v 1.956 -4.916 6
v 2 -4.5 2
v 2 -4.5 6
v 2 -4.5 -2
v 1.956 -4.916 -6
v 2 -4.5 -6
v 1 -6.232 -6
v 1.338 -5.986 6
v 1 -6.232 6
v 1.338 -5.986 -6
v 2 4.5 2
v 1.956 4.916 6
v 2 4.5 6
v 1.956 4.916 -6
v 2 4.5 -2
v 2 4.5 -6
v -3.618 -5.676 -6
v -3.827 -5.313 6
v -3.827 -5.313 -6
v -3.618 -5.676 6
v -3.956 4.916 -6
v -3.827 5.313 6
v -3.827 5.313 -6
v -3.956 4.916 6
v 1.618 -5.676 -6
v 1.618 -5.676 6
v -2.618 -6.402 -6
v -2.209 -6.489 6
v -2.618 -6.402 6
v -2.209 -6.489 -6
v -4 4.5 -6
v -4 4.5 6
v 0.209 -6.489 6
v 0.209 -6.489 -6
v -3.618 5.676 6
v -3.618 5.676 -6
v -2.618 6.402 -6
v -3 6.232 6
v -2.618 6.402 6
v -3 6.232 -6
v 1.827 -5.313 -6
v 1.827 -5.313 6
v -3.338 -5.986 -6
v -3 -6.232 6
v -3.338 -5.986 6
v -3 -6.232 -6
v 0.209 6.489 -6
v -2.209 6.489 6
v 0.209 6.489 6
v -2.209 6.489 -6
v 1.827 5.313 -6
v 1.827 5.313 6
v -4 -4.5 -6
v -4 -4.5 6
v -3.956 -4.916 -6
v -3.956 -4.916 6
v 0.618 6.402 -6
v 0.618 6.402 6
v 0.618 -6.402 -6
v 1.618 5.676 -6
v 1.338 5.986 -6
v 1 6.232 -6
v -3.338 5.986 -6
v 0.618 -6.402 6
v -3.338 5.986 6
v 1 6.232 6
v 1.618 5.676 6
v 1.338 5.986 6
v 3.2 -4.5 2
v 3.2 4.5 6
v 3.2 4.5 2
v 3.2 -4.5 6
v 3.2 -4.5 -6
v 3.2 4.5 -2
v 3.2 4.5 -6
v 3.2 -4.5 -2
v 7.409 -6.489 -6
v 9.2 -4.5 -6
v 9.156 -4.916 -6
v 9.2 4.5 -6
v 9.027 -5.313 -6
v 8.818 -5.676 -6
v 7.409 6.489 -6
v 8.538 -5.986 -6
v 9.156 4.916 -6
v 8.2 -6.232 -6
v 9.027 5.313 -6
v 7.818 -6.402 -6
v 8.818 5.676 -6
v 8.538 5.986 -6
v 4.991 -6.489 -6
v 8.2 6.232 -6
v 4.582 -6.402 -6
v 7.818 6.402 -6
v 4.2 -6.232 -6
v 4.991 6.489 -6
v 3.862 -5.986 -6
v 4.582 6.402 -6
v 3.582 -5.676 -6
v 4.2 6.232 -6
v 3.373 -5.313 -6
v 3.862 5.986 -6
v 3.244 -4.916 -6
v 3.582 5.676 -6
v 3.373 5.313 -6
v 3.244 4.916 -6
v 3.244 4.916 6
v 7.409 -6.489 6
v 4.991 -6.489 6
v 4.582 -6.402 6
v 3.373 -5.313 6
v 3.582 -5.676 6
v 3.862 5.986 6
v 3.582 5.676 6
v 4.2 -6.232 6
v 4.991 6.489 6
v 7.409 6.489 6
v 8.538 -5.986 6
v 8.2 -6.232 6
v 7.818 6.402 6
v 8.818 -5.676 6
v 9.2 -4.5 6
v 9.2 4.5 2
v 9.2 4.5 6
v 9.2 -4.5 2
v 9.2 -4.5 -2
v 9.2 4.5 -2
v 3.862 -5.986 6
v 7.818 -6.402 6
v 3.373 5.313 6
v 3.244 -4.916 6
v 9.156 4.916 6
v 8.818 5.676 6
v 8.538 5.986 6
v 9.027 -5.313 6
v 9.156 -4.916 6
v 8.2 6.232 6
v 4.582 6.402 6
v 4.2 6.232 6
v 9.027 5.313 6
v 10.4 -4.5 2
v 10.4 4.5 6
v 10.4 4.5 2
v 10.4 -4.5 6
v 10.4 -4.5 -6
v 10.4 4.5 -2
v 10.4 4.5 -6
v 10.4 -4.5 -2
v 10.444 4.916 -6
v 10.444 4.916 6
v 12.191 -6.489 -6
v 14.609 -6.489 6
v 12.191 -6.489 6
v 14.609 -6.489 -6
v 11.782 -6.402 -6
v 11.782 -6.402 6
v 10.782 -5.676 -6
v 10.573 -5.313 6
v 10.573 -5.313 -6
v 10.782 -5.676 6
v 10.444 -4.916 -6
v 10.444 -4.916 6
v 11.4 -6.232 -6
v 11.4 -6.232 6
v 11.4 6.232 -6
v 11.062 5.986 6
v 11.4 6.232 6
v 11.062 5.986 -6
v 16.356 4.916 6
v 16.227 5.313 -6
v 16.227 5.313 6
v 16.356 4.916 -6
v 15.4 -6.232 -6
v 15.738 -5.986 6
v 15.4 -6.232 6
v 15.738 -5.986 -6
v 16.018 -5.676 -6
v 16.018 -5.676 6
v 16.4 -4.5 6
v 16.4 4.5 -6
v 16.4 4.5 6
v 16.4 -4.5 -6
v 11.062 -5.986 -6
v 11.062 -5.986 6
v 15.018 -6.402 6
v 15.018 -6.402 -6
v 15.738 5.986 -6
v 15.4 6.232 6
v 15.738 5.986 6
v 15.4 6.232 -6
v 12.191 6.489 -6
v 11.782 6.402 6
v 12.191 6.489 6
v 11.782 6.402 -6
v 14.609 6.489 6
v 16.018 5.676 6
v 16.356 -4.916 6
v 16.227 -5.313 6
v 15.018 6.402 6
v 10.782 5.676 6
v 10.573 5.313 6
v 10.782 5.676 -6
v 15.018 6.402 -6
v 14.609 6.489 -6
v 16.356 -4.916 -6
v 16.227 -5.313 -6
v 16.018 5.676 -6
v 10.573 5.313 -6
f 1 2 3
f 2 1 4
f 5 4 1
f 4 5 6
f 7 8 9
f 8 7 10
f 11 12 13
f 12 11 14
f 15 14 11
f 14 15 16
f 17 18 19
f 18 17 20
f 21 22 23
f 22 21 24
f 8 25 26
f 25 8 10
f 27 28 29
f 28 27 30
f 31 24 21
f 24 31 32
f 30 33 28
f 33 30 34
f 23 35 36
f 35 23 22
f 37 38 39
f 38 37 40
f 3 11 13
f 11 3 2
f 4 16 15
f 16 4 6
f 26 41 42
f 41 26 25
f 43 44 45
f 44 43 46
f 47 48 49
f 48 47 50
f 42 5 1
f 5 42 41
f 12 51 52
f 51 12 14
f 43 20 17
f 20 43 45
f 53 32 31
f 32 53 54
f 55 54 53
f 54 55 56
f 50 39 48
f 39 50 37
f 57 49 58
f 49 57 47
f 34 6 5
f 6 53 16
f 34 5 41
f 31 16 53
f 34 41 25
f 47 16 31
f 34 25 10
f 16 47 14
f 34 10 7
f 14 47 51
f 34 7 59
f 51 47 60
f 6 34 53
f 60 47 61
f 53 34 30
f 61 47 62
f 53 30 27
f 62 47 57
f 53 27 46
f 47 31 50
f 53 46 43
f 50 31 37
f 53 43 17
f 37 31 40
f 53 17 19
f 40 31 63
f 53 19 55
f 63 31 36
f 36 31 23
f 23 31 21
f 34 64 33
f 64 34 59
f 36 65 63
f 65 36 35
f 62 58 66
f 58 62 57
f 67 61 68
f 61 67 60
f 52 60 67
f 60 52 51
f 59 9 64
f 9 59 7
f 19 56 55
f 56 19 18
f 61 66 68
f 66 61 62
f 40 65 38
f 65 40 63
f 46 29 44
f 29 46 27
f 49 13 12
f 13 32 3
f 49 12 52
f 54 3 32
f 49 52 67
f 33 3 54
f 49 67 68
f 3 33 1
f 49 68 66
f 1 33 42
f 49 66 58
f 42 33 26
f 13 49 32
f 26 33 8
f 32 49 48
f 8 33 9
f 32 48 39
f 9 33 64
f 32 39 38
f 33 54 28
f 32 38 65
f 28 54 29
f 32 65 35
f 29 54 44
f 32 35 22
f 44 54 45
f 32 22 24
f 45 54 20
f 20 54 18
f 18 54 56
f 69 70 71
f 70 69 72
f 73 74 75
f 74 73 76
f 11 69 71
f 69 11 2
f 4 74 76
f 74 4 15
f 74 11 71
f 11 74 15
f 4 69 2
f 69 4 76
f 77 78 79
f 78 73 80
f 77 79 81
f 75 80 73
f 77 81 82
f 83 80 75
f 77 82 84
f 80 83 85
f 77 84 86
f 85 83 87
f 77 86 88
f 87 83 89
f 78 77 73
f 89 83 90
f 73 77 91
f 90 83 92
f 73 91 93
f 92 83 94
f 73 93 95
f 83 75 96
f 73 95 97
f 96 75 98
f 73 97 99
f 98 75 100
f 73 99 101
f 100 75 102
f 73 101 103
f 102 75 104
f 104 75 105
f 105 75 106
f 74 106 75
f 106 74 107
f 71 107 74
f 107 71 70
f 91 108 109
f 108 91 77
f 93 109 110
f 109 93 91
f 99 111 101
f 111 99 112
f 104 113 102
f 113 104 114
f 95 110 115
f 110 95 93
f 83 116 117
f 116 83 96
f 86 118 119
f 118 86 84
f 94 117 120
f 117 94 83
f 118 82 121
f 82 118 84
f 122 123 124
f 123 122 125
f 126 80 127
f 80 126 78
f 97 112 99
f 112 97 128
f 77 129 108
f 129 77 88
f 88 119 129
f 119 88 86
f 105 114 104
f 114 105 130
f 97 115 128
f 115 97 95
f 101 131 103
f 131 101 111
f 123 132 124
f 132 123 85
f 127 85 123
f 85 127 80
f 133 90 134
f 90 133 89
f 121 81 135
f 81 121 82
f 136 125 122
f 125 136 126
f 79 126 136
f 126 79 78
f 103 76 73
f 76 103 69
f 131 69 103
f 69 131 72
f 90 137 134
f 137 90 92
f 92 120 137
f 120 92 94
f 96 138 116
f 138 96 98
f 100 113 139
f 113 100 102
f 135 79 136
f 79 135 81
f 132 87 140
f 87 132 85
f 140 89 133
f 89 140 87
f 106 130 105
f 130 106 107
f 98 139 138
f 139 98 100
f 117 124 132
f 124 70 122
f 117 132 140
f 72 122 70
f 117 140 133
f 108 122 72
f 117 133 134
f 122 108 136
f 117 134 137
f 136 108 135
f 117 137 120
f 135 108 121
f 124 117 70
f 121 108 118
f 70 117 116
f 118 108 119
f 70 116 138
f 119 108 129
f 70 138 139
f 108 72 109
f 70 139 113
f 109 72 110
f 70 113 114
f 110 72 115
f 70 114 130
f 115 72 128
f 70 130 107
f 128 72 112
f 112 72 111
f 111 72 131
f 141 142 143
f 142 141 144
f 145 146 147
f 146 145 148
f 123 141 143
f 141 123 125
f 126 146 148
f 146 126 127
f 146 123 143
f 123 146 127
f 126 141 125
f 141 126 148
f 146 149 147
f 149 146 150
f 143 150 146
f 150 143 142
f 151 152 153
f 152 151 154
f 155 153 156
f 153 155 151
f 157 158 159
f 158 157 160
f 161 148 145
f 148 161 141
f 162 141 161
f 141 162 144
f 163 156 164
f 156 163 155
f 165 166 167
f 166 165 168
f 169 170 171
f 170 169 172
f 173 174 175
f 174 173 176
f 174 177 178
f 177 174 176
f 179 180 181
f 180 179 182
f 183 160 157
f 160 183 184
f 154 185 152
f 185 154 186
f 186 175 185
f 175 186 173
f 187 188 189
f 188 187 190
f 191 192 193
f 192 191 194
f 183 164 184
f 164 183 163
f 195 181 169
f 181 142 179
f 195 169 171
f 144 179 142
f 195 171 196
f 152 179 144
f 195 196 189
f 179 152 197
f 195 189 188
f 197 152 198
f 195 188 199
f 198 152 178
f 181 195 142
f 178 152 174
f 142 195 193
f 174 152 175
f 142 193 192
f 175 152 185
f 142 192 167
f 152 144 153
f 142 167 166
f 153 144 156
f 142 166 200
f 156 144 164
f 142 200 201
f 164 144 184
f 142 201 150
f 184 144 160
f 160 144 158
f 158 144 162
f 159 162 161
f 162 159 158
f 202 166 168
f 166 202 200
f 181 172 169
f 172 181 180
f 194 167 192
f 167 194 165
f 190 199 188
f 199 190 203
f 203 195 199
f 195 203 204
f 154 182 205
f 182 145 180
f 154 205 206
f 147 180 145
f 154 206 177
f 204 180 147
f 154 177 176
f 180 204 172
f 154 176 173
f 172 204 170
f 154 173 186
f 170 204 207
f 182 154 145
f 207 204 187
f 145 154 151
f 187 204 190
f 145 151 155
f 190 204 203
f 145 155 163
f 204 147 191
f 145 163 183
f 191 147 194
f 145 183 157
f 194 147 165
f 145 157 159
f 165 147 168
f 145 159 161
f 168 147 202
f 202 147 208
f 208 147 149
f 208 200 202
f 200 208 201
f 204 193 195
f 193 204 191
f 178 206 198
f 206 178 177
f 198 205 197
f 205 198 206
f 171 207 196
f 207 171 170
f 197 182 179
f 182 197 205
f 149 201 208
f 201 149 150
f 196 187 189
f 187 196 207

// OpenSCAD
$fn=30;
height=12;
radius=2;
union(){
    hull(){
        translate([0,-4.5,0])cylinder(r=radius,h=height, center=true);
        translate([-2,4.5,0])cylinder(r=radius,h=height, center=true);
        translate([0,4.5,0])cylinder(r=radius,h=height, center=true);
        translate([-2,-4.5,0])cylinder(r=radius,h=height, center=true);
  }
  translate([2.6,0,0])cube([radius/1.666666667,radius+7,radius+2],center=true);
   translate([7.2,0,0]) hull(){
        translate([0,-4.5,0])cylinder(r=radius,h=height, center=true);
        translate([-2,4.5,0])cylinder(r=radius,h=height, center=true);
        translate([0,4.5,0])cylinder(r=radius,h=height, center=true);
        translate([-2,-4.5,0])cylinder(r=radius,h=height, center=true);
  }
  translate([9.8,0,0])cube([radius/1.666666667,radius+7,radius+2],center=true);
   translate([14.4,0,0]) hull(){
        translate([0,-4.5,0])cylinder(r=radius,h=height, center=true);
        translate([-2,4.5,0])cylinder(r=radius,h=height, center=true);
        translate([0,4.5,0])cylinder(r=radius,h=height, center=true);
        translate([-2,-4.5,0])cylinder(r=radius,h=height, center=true);
  }
}
